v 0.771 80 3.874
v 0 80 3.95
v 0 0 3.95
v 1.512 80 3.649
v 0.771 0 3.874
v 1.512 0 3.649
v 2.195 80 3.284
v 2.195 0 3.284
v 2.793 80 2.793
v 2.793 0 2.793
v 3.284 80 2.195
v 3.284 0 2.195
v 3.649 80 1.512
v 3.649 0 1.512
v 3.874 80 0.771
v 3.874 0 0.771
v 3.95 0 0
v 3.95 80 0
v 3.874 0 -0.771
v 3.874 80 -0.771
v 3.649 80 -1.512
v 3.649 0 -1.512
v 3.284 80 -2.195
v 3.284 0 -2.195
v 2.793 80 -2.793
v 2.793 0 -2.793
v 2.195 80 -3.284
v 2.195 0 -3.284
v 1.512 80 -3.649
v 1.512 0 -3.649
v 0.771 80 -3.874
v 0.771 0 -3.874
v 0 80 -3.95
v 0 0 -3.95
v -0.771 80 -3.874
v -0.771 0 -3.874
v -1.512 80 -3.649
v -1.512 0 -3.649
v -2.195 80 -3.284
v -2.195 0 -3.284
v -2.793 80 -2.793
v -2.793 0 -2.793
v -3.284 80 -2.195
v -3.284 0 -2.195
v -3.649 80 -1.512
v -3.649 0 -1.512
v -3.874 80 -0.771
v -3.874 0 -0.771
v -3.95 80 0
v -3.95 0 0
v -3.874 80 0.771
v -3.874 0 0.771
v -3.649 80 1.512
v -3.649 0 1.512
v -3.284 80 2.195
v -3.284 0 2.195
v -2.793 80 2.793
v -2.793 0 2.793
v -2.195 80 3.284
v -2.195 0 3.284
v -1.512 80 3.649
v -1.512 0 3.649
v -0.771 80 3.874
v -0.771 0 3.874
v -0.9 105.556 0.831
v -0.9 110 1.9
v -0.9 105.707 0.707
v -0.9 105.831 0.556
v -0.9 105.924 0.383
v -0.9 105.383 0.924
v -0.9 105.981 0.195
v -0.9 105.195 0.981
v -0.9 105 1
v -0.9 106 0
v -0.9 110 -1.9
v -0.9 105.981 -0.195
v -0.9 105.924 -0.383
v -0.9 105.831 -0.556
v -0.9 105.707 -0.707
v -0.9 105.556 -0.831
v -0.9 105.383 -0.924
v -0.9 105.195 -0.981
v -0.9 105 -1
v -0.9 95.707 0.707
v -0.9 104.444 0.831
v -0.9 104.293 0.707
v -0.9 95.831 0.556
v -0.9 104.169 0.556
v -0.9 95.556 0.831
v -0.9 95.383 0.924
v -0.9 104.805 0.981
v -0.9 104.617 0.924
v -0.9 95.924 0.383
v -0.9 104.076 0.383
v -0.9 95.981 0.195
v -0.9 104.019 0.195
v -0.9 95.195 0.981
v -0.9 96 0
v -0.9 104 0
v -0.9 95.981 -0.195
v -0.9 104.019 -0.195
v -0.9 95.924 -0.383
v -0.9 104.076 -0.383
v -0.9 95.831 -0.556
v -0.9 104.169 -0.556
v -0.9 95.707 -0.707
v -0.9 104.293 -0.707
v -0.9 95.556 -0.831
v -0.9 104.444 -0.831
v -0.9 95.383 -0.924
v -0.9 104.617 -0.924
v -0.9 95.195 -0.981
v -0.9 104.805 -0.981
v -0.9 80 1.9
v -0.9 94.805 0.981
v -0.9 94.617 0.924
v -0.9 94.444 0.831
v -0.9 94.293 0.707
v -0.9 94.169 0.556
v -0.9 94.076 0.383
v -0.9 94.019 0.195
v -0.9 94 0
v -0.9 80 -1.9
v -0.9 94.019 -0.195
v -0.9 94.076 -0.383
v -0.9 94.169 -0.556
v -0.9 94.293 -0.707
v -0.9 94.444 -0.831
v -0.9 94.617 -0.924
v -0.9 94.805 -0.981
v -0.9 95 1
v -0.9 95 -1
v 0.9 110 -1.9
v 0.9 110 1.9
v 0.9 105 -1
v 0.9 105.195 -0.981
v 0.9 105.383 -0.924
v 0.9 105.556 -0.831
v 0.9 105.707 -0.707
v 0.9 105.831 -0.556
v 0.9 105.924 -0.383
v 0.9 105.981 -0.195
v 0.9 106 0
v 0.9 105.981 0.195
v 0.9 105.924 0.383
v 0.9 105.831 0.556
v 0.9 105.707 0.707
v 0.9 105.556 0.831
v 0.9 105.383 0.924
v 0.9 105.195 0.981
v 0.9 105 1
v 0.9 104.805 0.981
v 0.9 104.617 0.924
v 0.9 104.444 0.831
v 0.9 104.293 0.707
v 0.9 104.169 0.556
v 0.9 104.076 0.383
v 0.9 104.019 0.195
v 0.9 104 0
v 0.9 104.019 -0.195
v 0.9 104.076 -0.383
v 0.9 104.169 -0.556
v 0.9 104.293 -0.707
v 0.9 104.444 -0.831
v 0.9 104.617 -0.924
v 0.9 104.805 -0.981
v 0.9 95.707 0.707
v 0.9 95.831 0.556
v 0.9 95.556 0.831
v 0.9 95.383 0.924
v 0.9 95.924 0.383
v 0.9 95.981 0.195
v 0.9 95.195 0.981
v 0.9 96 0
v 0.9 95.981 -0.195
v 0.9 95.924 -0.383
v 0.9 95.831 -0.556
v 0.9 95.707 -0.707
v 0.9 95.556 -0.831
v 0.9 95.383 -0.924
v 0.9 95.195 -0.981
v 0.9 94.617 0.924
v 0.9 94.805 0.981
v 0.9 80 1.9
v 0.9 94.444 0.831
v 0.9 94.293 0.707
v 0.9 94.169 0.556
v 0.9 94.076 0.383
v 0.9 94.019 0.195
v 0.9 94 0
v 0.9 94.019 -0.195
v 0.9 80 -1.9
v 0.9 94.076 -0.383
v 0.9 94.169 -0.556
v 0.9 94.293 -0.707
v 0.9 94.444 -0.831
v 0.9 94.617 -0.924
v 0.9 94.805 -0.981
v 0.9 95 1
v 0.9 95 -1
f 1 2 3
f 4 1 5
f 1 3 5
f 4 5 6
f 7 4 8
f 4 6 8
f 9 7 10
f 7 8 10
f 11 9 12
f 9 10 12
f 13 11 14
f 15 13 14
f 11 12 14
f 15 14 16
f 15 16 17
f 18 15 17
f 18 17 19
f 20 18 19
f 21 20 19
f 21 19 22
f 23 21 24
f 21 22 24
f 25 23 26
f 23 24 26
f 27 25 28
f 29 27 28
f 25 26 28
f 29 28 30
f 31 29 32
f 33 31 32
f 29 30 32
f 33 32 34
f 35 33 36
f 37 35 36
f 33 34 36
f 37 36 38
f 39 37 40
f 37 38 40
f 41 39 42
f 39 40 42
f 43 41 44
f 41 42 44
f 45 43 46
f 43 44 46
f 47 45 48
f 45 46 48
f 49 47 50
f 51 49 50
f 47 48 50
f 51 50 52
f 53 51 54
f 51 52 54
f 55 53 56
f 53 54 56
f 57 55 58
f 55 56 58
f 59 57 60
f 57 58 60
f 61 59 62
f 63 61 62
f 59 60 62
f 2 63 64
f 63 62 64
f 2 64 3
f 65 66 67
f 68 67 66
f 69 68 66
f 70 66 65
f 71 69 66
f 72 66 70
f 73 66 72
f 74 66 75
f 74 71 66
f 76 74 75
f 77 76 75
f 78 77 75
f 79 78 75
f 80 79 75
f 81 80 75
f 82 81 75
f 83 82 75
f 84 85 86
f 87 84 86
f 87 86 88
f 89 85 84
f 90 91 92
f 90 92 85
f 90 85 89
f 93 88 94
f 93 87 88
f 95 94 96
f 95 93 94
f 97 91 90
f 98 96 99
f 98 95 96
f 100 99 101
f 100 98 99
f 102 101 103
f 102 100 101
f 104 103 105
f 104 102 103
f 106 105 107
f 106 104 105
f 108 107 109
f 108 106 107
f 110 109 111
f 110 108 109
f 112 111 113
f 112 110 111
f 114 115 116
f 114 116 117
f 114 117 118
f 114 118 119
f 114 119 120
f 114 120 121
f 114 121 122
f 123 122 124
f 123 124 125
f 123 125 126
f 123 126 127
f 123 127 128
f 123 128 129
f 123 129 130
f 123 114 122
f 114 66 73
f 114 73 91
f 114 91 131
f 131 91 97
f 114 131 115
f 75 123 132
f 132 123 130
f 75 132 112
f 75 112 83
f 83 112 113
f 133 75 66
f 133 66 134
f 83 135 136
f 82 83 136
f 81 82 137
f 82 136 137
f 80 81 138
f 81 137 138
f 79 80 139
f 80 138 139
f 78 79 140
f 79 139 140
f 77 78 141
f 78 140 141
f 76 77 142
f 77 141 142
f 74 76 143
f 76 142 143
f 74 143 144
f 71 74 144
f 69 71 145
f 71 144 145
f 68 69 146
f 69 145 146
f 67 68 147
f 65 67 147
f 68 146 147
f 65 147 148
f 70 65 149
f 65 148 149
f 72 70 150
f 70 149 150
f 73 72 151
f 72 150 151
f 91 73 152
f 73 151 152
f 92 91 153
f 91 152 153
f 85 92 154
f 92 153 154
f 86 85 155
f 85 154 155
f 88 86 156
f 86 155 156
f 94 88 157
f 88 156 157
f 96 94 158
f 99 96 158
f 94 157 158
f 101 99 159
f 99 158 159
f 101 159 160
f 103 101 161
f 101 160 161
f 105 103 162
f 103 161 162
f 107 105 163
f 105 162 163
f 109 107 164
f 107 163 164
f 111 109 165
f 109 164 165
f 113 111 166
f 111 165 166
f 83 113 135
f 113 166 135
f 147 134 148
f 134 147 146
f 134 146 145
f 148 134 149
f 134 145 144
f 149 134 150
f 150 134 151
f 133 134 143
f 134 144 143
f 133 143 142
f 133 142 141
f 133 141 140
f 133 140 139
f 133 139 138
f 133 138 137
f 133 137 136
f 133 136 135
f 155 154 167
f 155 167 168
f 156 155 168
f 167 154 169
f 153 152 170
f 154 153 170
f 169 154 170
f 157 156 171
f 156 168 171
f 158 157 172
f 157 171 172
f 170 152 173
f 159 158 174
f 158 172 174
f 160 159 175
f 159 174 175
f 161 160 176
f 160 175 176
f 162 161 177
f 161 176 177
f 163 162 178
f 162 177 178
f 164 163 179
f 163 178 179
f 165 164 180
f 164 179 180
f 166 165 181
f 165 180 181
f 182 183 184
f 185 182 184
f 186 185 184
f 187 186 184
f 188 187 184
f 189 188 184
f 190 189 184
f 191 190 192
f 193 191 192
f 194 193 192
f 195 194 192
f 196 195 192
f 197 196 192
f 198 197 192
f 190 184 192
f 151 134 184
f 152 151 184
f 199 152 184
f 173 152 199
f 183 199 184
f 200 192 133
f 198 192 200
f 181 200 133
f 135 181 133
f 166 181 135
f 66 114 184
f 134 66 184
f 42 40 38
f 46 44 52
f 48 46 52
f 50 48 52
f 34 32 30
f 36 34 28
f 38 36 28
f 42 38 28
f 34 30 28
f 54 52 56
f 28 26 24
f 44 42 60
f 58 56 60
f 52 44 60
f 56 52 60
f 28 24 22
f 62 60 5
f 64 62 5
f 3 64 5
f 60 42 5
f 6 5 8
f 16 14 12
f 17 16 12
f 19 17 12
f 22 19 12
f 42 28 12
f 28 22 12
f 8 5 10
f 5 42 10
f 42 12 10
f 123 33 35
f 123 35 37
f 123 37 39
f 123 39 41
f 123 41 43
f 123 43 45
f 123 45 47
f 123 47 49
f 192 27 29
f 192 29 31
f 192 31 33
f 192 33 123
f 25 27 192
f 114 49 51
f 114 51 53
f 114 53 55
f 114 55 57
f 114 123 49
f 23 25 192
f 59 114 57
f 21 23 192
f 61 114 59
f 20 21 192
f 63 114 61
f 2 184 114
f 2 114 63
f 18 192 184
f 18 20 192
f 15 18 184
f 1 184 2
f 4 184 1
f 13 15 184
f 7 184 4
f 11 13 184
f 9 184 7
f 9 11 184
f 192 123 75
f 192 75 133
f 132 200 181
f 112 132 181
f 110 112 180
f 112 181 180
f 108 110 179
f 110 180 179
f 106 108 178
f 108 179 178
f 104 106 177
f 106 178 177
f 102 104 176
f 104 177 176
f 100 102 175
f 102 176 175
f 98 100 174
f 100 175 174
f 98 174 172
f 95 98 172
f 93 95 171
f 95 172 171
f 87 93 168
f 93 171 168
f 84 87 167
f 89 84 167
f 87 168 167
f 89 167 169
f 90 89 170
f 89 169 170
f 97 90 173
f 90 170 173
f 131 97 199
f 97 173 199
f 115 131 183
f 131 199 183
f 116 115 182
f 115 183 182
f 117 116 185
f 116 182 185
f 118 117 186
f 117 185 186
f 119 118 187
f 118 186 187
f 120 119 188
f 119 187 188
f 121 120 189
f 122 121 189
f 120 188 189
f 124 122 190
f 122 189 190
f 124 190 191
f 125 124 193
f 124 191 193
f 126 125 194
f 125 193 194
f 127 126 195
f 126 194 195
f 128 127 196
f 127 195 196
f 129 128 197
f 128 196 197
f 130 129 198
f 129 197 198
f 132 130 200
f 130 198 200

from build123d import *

# Parameters (mm, degrees)
SKETCH2_R           = 3.95
BOSS_EXTRUDE1_DEPTH = 80
SKETCH3_W           = 1.8
SKETCH3_H           = 3.8
BOSS_EXTRUDE3_DEPTH = 30
SKETCH5_R           = 1
CUT_EXTRUDE1_DEPTH  = 1.8


with BuildPart() as part:
    # Sketch2 → Boss-Extrude1 (new body)
    with BuildSketch(Plane(origin=(0, 0, 0), x_dir=(1, 0, 0), z_dir=(0, 1, 0))):
        with Locations(Location((0, 0, 0), (0, 0, 270))):  # turned: the seam where the file's is
            Circle(SKETCH2_R)
    extrude(amount=BOSS_EXTRUDE1_DEPTH)

    # Sketch3 → Boss-Extrude3 (add)
    with BuildSketch(Plane(origin=(0, 80, 0), x_dir=(1, 0, 0), z_dir=(0, 1, 0))):
        Rectangle(SKETCH3_W, SKETCH3_H)
    extrude(amount=BOSS_EXTRUDE3_DEPTH)

    # Sketch5 → Cut-Extrude1 (cut)
    with BuildSketch(Plane(origin=(0.9, 0, 0), x_dir=(0, 0, -1), z_dir=(1, 0, 0))):
        with Locations((0, 105)):
            Circle(SKETCH5_R)
        with Locations((0, 95)):
            Circle(SKETCH5_R)
    extrude(amount=-CUT_EXTRUDE1_DEPTH, mode=Mode.SUBTRACT)


solid = part.part
